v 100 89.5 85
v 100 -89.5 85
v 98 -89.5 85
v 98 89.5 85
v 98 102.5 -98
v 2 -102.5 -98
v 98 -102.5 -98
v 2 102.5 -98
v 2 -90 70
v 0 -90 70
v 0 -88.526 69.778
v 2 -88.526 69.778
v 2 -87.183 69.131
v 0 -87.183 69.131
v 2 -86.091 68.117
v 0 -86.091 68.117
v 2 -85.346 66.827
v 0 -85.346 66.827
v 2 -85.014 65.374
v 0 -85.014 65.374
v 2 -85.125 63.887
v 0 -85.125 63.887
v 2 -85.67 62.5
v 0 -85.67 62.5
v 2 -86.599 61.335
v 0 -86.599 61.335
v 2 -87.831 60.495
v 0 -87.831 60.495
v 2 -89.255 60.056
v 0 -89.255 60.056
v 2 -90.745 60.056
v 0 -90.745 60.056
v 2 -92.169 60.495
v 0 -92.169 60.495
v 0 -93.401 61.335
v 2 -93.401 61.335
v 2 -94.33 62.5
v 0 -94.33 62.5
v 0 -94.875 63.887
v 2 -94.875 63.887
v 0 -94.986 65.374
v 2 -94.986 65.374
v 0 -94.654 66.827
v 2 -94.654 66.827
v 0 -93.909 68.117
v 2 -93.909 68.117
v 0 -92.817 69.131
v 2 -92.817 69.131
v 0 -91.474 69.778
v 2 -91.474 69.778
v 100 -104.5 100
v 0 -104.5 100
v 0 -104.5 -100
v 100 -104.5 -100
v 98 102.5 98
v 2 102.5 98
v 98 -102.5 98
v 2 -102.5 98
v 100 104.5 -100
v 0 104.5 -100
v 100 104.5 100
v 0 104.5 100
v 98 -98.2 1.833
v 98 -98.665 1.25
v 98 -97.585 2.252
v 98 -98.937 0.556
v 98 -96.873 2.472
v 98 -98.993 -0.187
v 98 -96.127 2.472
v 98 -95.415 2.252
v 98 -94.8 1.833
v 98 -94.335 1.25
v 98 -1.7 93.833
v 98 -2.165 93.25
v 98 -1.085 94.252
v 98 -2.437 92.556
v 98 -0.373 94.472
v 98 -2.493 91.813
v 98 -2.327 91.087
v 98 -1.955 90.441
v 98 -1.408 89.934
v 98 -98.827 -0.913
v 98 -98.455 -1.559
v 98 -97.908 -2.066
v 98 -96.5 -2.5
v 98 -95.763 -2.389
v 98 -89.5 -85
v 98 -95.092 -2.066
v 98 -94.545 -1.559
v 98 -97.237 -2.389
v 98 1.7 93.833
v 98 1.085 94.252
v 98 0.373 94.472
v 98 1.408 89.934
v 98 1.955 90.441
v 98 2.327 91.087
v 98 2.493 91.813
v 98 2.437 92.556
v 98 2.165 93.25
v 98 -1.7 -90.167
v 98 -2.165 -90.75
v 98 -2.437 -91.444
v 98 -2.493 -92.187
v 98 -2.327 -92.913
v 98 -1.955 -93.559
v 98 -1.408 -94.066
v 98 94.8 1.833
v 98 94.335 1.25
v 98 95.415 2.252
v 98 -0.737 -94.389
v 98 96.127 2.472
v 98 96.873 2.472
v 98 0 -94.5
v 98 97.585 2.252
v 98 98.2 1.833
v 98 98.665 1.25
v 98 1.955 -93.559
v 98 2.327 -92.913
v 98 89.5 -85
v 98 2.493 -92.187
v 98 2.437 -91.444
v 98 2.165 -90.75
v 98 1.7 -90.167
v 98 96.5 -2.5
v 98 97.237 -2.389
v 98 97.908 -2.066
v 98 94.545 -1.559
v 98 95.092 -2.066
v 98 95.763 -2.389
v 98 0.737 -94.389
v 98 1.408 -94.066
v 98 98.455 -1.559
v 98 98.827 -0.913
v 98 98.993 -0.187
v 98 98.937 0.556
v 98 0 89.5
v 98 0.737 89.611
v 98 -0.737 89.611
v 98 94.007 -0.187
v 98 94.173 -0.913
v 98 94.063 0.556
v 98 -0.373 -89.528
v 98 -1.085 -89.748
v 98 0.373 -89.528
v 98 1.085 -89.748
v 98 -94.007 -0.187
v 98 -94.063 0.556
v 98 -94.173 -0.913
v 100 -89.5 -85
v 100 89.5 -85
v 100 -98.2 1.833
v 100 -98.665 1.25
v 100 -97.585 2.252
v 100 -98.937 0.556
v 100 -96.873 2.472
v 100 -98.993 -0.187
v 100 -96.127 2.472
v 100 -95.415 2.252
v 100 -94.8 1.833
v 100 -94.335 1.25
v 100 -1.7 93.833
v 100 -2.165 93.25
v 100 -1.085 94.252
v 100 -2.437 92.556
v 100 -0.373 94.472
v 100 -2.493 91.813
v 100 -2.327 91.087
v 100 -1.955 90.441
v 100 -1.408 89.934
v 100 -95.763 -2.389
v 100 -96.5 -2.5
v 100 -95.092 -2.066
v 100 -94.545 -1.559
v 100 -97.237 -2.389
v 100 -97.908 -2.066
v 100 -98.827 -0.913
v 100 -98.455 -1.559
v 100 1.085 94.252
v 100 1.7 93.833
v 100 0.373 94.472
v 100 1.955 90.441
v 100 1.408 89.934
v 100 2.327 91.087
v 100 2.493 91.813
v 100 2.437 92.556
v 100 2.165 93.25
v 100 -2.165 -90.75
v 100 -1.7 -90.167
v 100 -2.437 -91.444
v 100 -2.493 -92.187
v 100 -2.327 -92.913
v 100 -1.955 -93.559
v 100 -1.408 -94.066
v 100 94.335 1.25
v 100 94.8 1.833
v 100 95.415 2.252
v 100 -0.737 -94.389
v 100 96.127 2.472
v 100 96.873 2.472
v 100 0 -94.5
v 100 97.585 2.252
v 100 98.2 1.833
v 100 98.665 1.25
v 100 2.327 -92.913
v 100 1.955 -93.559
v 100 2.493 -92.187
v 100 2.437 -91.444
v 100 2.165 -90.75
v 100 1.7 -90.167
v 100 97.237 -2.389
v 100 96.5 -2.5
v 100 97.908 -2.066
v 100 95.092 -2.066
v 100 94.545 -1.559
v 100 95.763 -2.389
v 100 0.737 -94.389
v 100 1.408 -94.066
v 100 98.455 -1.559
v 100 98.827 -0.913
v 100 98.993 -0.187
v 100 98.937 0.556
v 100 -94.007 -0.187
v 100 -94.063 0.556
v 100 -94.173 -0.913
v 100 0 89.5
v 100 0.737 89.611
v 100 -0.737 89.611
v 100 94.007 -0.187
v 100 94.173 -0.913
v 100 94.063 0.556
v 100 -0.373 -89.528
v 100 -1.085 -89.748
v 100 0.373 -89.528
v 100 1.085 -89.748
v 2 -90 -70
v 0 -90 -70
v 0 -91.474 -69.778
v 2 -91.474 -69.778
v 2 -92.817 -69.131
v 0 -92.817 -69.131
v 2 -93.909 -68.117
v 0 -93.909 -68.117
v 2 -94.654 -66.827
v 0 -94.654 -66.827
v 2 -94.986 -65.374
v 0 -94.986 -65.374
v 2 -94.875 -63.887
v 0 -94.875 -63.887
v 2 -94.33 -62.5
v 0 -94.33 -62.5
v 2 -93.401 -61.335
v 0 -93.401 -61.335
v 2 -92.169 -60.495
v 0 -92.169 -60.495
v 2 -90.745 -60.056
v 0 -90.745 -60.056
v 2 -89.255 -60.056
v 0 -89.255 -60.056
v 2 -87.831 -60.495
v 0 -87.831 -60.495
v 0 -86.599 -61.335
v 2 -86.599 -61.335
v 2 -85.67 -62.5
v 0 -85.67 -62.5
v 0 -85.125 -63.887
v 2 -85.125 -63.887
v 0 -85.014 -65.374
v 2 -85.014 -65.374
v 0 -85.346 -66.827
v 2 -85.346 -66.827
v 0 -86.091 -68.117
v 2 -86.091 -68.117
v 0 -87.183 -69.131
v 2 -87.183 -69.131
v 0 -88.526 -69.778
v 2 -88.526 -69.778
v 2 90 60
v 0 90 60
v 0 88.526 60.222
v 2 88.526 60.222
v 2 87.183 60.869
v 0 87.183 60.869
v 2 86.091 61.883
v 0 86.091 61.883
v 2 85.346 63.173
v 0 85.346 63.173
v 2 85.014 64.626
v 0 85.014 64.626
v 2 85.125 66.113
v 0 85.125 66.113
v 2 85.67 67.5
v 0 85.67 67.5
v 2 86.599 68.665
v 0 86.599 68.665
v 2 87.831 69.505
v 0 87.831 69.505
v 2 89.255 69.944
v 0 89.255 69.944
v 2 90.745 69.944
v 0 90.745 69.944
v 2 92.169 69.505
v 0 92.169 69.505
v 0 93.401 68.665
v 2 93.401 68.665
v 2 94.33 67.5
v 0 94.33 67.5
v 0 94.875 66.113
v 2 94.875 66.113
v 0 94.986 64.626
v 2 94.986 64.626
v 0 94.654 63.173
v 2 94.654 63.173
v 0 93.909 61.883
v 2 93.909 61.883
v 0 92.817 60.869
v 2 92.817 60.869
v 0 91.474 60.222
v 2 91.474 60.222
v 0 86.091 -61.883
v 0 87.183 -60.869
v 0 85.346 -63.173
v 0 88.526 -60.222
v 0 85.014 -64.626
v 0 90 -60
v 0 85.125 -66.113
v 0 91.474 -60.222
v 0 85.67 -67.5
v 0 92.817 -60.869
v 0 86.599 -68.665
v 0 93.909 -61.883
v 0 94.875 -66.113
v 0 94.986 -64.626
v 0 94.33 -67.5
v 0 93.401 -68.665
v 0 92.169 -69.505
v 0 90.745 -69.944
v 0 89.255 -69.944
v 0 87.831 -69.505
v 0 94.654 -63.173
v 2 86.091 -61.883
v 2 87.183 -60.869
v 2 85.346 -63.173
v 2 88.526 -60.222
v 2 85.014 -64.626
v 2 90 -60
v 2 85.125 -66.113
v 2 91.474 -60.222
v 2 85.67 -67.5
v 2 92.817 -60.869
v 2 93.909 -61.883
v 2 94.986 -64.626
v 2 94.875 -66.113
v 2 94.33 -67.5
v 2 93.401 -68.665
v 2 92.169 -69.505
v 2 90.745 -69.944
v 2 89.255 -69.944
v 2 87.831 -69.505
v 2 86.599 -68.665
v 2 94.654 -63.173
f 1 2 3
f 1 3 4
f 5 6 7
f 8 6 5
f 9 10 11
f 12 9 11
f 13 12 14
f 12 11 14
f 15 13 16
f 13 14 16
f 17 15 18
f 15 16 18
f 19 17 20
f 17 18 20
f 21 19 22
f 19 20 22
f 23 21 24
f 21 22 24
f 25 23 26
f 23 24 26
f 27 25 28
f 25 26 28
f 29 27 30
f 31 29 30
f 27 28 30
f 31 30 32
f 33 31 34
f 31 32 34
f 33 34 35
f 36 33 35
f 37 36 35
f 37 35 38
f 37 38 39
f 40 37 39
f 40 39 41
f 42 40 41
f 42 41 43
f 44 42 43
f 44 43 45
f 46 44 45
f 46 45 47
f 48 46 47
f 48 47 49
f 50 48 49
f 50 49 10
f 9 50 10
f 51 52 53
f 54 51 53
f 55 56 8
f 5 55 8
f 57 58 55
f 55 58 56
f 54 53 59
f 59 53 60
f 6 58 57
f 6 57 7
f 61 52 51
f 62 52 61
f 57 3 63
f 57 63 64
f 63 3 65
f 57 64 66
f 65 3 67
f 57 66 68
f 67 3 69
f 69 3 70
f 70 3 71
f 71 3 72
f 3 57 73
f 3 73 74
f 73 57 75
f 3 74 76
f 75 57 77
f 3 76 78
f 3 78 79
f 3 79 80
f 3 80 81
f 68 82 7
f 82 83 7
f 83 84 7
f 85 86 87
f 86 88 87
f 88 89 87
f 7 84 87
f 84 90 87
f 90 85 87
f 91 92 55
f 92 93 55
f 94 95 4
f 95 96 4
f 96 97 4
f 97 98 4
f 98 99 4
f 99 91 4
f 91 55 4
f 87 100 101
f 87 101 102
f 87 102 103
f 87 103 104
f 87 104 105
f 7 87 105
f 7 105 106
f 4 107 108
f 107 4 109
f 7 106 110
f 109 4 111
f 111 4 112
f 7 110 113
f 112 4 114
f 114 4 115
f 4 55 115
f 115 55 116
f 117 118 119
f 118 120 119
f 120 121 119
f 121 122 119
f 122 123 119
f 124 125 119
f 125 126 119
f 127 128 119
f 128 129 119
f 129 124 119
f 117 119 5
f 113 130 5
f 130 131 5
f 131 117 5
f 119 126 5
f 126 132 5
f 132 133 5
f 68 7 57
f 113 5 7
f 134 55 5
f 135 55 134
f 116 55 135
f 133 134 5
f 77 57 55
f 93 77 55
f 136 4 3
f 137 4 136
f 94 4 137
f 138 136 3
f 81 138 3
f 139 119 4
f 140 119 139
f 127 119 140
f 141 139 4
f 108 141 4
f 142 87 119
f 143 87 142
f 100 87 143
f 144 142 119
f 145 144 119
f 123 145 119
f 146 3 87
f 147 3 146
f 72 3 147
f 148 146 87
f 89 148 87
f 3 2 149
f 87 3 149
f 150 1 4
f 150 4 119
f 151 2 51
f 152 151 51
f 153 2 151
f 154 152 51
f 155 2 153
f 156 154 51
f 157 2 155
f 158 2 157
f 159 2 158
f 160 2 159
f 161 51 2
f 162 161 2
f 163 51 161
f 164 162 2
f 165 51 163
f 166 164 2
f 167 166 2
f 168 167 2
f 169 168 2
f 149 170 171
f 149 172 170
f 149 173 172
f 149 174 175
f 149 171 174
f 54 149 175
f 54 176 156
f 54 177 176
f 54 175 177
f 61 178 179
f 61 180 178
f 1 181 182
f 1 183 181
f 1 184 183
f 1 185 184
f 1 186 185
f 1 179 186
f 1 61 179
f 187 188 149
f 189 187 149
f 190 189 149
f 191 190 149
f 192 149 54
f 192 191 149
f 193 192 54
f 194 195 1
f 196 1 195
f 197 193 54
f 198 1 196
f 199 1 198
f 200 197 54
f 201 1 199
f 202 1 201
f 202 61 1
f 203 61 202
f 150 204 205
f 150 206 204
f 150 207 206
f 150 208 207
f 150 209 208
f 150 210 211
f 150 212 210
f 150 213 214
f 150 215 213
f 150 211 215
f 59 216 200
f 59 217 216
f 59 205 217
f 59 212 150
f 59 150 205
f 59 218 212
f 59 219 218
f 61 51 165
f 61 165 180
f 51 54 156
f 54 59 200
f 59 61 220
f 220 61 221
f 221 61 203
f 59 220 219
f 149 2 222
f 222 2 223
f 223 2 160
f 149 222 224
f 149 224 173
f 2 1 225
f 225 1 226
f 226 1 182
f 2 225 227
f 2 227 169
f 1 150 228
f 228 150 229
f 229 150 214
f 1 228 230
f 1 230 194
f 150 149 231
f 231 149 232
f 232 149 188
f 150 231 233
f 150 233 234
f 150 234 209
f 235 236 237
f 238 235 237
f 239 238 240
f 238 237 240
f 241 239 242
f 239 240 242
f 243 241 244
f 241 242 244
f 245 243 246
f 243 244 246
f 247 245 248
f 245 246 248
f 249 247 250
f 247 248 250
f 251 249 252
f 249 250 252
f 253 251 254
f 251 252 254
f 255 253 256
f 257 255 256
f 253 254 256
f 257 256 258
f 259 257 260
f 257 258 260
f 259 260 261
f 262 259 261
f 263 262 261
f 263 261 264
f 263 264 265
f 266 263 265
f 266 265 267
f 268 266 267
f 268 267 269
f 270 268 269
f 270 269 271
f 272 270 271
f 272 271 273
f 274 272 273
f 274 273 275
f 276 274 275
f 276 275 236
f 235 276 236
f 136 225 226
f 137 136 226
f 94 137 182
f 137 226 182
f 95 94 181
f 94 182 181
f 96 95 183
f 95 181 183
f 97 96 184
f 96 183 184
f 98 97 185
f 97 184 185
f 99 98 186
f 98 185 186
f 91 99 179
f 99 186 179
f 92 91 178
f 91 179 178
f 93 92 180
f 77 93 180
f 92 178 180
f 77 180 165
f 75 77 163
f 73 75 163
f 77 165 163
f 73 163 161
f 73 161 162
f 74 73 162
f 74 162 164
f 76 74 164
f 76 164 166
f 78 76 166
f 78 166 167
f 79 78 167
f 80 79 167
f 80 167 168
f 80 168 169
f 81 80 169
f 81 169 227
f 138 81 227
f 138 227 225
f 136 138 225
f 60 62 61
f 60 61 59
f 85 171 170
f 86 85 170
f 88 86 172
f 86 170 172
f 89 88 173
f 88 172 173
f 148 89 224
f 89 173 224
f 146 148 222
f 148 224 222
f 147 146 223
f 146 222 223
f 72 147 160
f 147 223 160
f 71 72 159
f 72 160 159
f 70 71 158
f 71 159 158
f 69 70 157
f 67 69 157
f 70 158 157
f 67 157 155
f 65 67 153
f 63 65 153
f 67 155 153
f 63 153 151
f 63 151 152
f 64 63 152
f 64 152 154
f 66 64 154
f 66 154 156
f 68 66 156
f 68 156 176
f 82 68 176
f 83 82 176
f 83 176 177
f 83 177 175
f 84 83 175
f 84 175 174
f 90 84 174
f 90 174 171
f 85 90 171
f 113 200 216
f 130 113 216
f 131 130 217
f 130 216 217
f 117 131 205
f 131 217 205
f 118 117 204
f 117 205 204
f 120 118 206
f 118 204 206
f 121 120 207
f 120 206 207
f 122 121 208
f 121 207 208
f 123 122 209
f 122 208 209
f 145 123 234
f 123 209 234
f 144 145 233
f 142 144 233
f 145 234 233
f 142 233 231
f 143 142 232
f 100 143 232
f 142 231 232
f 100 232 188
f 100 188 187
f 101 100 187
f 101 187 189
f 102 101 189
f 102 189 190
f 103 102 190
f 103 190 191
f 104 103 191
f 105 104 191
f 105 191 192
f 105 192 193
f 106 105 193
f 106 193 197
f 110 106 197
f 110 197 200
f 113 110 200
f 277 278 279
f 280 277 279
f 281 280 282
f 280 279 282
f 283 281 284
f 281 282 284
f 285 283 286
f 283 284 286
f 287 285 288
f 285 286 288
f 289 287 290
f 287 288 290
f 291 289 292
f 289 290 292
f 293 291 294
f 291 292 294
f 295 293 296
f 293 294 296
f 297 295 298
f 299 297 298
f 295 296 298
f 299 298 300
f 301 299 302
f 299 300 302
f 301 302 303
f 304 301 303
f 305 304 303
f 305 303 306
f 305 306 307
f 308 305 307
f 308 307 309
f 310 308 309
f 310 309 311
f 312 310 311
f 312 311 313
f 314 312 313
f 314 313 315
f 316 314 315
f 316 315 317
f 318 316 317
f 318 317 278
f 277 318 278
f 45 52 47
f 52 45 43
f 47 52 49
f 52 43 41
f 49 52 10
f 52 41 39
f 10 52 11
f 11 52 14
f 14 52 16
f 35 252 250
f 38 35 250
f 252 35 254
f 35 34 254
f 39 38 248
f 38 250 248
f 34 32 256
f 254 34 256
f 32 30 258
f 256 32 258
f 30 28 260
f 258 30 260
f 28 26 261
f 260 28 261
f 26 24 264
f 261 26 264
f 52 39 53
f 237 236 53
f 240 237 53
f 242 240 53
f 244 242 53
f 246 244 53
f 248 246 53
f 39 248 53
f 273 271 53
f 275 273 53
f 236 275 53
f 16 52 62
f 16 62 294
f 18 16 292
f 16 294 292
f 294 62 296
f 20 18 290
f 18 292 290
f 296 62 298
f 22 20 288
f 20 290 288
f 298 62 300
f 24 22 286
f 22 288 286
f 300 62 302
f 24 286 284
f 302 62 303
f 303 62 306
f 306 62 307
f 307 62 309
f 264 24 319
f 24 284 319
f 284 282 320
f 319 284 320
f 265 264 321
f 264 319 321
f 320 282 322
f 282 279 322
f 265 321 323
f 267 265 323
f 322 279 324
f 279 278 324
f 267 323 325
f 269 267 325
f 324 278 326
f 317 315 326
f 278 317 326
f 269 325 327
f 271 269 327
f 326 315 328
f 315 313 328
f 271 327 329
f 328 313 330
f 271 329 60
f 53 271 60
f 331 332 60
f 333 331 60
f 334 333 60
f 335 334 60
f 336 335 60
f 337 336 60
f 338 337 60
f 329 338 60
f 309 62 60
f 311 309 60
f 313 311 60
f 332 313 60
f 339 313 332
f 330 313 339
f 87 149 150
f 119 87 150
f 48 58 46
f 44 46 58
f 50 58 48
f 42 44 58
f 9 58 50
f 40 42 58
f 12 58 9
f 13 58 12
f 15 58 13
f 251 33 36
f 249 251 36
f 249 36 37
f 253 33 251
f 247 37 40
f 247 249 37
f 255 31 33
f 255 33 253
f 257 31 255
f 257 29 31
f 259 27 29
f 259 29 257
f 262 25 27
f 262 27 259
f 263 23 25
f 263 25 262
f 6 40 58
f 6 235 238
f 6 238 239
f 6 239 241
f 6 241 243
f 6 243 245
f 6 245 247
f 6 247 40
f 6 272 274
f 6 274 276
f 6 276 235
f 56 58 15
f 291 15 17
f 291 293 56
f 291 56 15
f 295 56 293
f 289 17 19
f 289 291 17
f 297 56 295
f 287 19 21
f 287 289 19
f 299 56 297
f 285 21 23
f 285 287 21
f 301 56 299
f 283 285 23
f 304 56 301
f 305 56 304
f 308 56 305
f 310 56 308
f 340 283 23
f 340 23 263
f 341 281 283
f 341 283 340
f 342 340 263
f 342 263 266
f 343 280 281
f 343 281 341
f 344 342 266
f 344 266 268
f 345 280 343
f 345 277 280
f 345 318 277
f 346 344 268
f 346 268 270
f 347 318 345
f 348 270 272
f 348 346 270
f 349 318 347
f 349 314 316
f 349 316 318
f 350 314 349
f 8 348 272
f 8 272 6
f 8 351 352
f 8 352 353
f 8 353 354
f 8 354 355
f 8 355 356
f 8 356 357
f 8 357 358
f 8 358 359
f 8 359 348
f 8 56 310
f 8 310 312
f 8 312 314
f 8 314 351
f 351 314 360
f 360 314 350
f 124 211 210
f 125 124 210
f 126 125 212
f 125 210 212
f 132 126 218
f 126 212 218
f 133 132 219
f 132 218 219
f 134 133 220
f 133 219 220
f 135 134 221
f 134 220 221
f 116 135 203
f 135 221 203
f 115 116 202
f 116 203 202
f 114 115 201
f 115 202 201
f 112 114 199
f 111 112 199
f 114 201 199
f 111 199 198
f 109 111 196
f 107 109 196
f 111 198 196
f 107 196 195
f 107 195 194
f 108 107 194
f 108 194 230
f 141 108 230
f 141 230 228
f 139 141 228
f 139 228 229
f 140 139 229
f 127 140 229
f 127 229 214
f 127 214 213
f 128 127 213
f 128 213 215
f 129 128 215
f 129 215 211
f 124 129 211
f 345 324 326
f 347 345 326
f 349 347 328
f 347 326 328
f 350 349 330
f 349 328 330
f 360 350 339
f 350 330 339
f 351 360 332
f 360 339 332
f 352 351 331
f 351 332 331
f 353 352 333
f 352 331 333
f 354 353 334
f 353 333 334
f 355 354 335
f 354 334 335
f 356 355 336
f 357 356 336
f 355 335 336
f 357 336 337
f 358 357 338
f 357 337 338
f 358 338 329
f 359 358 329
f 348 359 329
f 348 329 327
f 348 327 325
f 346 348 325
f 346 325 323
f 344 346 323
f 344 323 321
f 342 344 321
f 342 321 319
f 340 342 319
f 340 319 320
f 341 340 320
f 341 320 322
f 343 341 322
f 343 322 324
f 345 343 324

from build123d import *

# Parameters (mm, degrees)
SKETCH_1_W          = 200
SKETCH_1_H          = 209
EXTRUDE_1_DEPTH     = 100
SHELL_1_T           = 2
CUT_EXTRUDE_1_REACH = 177.842
SKETCH_2_W          = 170
SKETCH_2_H          = 179
CUT_EXTRUDE_2_REACH = 177.842
SKETCH_3_R          = 2.5
CUT_EXTRUDE_3_REACH = 177.842
SKETCH_4_R          = 5


with BuildPart() as part:
    # 草图1 → 凸台-拉伸1 (new body)
    with BuildSketch(Plane(origin=(0, 0, 0), x_dir=(0, 0, -1), z_dir=(1, 0, 0))):
        Rectangle(SKETCH_1_W, SKETCH_1_H)
    extrude(amount=EXTRUDE_1_DEPTH)

    # 抽壳1 (no face opened: a closed hollow body)
    add(offset(amount=-SHELL_1_T, mode=Mode.PRIVATE), mode=Mode.SUBTRACT)

    # 草图2 → 切除-拉伸1 (cut, up to next)
    with BuildSketch(Plane(origin=(100, 0, 0), x_dir=(0, 0, -1), z_dir=(1, 0, 0)), mode=Mode.PRIVATE) as cut_extrude_1_sk1:
        Rectangle(SKETCH_2_W, SKETCH_2_H)
    cut_extrude_1_tool1 = extrude(cut_extrude_1_sk1.sketch, amount=-CUT_EXTRUDE_1_REACH, mode=Mode.PRIVATE) & part.part
    add(cut_extrude_1_tool1.solids().sort_by_distance((100, 0, 0))[0], mode=Mode.SUBTRACT)

    # 草图3 → 切除-拉伸2 (cut, up to next)
    with BuildSketch(Plane(origin=(100, 0, 0), x_dir=(0, 0, -1), z_dir=(1, 0, 0)), mode=Mode.PRIVATE) as cut_extrude_2_sk1:
        with Locations((0, 96.5)):
            Circle(SKETCH_3_R)
    cut_extrude_2_tool1 = extrude(cut_extrude_2_sk1.sketch, amount=-CUT_EXTRUDE_2_REACH, mode=Mode.PRIVATE) & part.part
    # 草图3 → 切除-拉伸2 (cut, up to next)
    with BuildSketch(Plane(origin=(100, 0, 0), x_dir=(0, 0, -1), z_dir=(1, 0, 0)), mode=Mode.PRIVATE) as cut_extrude_2_sk2:
        with Locations((-92, 0)):
            Circle(SKETCH_3_R)
    cut_extrude_2_tool2 = extrude(cut_extrude_2_sk2.sketch, amount=-CUT_EXTRUDE_2_REACH, mode=Mode.PRIVATE) & part.part
    # 草图3 → 切除-拉伸2 (cut, up to next)
    with BuildSketch(Plane(origin=(100, 0, 0), x_dir=(0, 0, -1), z_dir=(1, 0, 0)), mode=Mode.PRIVATE) as cut_extrude_2_sk3:
        with Locations((0, -96.5)):
            Circle(SKETCH_3_R)
    cut_extrude_2_tool3 = extrude(cut_extrude_2_sk3.sketch, amount=-CUT_EXTRUDE_2_REACH, mode=Mode.PRIVATE) & part.part
    # 草图3 → 切除-拉伸2 (cut, up to next)
    with BuildSketch(Plane(origin=(100, 0, 0), x_dir=(0, 0, -1), z_dir=(1, 0, 0)), mode=Mode.PRIVATE) as cut_extrude_2_sk4:
        with Locations((92, 0)):
            Circle(SKETCH_3_R)
    cut_extrude_2_tool4 = extrude(cut_extrude_2_sk4.sketch, amount=-CUT_EXTRUDE_2_REACH, mode=Mode.PRIVATE) & part.part
    add(cut_extrude_2_tool1.solids().sort_by_distance((100, 96.5, 0))[0], mode=Mode.SUBTRACT)
    add(cut_extrude_2_tool2.solids().sort_by_distance((100, 0, 92))[0], mode=Mode.SUBTRACT)
    add(cut_extrude_2_tool3.solids().sort_by_distance((100, -96.5, 0))[0], mode=Mode.SUBTRACT)
    add(cut_extrude_2_tool4.solids().sort_by_distance((100, 0, -92))[0], mode=Mode.SUBTRACT)

    # 草图4 → 切除-拉伸3 (cut, up to next)
    with BuildSketch(Plane.ZY, mode=Mode.PRIVATE) as cut_extrude_3_sk1:
        with Locations((-65, 90)):
            Circle(SKETCH_4_R)
    cut_extrude_3_tool1 = extrude(cut_extrude_3_sk1.sketch, amount=-CUT_EXTRUDE_3_REACH, mode=Mode.PRIVATE) & part.part
    # 草图4 → 切除-拉伸3 (cut, up to next)
    with BuildSketch(Plane.ZY, mode=Mode.PRIVATE) as cut_extrude_3_sk2:
        with Locations(Location((65, 90, 0), (0, 0, 180))):
            Circle(SKETCH_4_R)
    cut_extrude_3_tool2 = extrude(cut_extrude_3_sk2.sketch, amount=-CUT_EXTRUDE_3_REACH, mode=Mode.PRIVATE) & part.part
    # 草图4 → 切除-拉伸3 (cut, up to next)
    with BuildSketch(Plane.ZY, mode=Mode.PRIVATE) as cut_extrude_3_sk3:
        with Locations(Location((-65, -90, 0), (0, 0, 180))):
            Circle(SKETCH_4_R)
    cut_extrude_3_tool3 = extrude(cut_extrude_3_sk3.sketch, amount=-CUT_EXTRUDE_3_REACH, mode=Mode.PRIVATE) & part.part
    # 草图4 → 切除-拉伸3 (cut, up to next)
    with BuildSketch(Plane.ZY, mode=Mode.PRIVATE) as cut_extrude_3_sk4:
        with Locations((65, -90)):
            Circle(SKETCH_4_R)
    cut_extrude_3_tool4 = extrude(cut_extrude_3_sk4.sketch, amount=-CUT_EXTRUDE_3_REACH, mode=Mode.PRIVATE) & part.part
    add(cut_extrude_3_tool1.solids().sort_by_distance((0, 90, -65))[0], mode=Mode.SUBTRACT)
    add(cut_extrude_3_tool2.solids().sort_by_distance((0, 90, 65))[0], mode=Mode.SUBTRACT)
    add(cut_extrude_3_tool3.solids().sort_by_distance((0, -90, -65))[0], mode=Mode.SUBTRACT)
    add(cut_extrude_3_tool4.solids().sort_by_distance((0, -90, 65))[0], mode=Mode.SUBTRACT)


solid = part.part
